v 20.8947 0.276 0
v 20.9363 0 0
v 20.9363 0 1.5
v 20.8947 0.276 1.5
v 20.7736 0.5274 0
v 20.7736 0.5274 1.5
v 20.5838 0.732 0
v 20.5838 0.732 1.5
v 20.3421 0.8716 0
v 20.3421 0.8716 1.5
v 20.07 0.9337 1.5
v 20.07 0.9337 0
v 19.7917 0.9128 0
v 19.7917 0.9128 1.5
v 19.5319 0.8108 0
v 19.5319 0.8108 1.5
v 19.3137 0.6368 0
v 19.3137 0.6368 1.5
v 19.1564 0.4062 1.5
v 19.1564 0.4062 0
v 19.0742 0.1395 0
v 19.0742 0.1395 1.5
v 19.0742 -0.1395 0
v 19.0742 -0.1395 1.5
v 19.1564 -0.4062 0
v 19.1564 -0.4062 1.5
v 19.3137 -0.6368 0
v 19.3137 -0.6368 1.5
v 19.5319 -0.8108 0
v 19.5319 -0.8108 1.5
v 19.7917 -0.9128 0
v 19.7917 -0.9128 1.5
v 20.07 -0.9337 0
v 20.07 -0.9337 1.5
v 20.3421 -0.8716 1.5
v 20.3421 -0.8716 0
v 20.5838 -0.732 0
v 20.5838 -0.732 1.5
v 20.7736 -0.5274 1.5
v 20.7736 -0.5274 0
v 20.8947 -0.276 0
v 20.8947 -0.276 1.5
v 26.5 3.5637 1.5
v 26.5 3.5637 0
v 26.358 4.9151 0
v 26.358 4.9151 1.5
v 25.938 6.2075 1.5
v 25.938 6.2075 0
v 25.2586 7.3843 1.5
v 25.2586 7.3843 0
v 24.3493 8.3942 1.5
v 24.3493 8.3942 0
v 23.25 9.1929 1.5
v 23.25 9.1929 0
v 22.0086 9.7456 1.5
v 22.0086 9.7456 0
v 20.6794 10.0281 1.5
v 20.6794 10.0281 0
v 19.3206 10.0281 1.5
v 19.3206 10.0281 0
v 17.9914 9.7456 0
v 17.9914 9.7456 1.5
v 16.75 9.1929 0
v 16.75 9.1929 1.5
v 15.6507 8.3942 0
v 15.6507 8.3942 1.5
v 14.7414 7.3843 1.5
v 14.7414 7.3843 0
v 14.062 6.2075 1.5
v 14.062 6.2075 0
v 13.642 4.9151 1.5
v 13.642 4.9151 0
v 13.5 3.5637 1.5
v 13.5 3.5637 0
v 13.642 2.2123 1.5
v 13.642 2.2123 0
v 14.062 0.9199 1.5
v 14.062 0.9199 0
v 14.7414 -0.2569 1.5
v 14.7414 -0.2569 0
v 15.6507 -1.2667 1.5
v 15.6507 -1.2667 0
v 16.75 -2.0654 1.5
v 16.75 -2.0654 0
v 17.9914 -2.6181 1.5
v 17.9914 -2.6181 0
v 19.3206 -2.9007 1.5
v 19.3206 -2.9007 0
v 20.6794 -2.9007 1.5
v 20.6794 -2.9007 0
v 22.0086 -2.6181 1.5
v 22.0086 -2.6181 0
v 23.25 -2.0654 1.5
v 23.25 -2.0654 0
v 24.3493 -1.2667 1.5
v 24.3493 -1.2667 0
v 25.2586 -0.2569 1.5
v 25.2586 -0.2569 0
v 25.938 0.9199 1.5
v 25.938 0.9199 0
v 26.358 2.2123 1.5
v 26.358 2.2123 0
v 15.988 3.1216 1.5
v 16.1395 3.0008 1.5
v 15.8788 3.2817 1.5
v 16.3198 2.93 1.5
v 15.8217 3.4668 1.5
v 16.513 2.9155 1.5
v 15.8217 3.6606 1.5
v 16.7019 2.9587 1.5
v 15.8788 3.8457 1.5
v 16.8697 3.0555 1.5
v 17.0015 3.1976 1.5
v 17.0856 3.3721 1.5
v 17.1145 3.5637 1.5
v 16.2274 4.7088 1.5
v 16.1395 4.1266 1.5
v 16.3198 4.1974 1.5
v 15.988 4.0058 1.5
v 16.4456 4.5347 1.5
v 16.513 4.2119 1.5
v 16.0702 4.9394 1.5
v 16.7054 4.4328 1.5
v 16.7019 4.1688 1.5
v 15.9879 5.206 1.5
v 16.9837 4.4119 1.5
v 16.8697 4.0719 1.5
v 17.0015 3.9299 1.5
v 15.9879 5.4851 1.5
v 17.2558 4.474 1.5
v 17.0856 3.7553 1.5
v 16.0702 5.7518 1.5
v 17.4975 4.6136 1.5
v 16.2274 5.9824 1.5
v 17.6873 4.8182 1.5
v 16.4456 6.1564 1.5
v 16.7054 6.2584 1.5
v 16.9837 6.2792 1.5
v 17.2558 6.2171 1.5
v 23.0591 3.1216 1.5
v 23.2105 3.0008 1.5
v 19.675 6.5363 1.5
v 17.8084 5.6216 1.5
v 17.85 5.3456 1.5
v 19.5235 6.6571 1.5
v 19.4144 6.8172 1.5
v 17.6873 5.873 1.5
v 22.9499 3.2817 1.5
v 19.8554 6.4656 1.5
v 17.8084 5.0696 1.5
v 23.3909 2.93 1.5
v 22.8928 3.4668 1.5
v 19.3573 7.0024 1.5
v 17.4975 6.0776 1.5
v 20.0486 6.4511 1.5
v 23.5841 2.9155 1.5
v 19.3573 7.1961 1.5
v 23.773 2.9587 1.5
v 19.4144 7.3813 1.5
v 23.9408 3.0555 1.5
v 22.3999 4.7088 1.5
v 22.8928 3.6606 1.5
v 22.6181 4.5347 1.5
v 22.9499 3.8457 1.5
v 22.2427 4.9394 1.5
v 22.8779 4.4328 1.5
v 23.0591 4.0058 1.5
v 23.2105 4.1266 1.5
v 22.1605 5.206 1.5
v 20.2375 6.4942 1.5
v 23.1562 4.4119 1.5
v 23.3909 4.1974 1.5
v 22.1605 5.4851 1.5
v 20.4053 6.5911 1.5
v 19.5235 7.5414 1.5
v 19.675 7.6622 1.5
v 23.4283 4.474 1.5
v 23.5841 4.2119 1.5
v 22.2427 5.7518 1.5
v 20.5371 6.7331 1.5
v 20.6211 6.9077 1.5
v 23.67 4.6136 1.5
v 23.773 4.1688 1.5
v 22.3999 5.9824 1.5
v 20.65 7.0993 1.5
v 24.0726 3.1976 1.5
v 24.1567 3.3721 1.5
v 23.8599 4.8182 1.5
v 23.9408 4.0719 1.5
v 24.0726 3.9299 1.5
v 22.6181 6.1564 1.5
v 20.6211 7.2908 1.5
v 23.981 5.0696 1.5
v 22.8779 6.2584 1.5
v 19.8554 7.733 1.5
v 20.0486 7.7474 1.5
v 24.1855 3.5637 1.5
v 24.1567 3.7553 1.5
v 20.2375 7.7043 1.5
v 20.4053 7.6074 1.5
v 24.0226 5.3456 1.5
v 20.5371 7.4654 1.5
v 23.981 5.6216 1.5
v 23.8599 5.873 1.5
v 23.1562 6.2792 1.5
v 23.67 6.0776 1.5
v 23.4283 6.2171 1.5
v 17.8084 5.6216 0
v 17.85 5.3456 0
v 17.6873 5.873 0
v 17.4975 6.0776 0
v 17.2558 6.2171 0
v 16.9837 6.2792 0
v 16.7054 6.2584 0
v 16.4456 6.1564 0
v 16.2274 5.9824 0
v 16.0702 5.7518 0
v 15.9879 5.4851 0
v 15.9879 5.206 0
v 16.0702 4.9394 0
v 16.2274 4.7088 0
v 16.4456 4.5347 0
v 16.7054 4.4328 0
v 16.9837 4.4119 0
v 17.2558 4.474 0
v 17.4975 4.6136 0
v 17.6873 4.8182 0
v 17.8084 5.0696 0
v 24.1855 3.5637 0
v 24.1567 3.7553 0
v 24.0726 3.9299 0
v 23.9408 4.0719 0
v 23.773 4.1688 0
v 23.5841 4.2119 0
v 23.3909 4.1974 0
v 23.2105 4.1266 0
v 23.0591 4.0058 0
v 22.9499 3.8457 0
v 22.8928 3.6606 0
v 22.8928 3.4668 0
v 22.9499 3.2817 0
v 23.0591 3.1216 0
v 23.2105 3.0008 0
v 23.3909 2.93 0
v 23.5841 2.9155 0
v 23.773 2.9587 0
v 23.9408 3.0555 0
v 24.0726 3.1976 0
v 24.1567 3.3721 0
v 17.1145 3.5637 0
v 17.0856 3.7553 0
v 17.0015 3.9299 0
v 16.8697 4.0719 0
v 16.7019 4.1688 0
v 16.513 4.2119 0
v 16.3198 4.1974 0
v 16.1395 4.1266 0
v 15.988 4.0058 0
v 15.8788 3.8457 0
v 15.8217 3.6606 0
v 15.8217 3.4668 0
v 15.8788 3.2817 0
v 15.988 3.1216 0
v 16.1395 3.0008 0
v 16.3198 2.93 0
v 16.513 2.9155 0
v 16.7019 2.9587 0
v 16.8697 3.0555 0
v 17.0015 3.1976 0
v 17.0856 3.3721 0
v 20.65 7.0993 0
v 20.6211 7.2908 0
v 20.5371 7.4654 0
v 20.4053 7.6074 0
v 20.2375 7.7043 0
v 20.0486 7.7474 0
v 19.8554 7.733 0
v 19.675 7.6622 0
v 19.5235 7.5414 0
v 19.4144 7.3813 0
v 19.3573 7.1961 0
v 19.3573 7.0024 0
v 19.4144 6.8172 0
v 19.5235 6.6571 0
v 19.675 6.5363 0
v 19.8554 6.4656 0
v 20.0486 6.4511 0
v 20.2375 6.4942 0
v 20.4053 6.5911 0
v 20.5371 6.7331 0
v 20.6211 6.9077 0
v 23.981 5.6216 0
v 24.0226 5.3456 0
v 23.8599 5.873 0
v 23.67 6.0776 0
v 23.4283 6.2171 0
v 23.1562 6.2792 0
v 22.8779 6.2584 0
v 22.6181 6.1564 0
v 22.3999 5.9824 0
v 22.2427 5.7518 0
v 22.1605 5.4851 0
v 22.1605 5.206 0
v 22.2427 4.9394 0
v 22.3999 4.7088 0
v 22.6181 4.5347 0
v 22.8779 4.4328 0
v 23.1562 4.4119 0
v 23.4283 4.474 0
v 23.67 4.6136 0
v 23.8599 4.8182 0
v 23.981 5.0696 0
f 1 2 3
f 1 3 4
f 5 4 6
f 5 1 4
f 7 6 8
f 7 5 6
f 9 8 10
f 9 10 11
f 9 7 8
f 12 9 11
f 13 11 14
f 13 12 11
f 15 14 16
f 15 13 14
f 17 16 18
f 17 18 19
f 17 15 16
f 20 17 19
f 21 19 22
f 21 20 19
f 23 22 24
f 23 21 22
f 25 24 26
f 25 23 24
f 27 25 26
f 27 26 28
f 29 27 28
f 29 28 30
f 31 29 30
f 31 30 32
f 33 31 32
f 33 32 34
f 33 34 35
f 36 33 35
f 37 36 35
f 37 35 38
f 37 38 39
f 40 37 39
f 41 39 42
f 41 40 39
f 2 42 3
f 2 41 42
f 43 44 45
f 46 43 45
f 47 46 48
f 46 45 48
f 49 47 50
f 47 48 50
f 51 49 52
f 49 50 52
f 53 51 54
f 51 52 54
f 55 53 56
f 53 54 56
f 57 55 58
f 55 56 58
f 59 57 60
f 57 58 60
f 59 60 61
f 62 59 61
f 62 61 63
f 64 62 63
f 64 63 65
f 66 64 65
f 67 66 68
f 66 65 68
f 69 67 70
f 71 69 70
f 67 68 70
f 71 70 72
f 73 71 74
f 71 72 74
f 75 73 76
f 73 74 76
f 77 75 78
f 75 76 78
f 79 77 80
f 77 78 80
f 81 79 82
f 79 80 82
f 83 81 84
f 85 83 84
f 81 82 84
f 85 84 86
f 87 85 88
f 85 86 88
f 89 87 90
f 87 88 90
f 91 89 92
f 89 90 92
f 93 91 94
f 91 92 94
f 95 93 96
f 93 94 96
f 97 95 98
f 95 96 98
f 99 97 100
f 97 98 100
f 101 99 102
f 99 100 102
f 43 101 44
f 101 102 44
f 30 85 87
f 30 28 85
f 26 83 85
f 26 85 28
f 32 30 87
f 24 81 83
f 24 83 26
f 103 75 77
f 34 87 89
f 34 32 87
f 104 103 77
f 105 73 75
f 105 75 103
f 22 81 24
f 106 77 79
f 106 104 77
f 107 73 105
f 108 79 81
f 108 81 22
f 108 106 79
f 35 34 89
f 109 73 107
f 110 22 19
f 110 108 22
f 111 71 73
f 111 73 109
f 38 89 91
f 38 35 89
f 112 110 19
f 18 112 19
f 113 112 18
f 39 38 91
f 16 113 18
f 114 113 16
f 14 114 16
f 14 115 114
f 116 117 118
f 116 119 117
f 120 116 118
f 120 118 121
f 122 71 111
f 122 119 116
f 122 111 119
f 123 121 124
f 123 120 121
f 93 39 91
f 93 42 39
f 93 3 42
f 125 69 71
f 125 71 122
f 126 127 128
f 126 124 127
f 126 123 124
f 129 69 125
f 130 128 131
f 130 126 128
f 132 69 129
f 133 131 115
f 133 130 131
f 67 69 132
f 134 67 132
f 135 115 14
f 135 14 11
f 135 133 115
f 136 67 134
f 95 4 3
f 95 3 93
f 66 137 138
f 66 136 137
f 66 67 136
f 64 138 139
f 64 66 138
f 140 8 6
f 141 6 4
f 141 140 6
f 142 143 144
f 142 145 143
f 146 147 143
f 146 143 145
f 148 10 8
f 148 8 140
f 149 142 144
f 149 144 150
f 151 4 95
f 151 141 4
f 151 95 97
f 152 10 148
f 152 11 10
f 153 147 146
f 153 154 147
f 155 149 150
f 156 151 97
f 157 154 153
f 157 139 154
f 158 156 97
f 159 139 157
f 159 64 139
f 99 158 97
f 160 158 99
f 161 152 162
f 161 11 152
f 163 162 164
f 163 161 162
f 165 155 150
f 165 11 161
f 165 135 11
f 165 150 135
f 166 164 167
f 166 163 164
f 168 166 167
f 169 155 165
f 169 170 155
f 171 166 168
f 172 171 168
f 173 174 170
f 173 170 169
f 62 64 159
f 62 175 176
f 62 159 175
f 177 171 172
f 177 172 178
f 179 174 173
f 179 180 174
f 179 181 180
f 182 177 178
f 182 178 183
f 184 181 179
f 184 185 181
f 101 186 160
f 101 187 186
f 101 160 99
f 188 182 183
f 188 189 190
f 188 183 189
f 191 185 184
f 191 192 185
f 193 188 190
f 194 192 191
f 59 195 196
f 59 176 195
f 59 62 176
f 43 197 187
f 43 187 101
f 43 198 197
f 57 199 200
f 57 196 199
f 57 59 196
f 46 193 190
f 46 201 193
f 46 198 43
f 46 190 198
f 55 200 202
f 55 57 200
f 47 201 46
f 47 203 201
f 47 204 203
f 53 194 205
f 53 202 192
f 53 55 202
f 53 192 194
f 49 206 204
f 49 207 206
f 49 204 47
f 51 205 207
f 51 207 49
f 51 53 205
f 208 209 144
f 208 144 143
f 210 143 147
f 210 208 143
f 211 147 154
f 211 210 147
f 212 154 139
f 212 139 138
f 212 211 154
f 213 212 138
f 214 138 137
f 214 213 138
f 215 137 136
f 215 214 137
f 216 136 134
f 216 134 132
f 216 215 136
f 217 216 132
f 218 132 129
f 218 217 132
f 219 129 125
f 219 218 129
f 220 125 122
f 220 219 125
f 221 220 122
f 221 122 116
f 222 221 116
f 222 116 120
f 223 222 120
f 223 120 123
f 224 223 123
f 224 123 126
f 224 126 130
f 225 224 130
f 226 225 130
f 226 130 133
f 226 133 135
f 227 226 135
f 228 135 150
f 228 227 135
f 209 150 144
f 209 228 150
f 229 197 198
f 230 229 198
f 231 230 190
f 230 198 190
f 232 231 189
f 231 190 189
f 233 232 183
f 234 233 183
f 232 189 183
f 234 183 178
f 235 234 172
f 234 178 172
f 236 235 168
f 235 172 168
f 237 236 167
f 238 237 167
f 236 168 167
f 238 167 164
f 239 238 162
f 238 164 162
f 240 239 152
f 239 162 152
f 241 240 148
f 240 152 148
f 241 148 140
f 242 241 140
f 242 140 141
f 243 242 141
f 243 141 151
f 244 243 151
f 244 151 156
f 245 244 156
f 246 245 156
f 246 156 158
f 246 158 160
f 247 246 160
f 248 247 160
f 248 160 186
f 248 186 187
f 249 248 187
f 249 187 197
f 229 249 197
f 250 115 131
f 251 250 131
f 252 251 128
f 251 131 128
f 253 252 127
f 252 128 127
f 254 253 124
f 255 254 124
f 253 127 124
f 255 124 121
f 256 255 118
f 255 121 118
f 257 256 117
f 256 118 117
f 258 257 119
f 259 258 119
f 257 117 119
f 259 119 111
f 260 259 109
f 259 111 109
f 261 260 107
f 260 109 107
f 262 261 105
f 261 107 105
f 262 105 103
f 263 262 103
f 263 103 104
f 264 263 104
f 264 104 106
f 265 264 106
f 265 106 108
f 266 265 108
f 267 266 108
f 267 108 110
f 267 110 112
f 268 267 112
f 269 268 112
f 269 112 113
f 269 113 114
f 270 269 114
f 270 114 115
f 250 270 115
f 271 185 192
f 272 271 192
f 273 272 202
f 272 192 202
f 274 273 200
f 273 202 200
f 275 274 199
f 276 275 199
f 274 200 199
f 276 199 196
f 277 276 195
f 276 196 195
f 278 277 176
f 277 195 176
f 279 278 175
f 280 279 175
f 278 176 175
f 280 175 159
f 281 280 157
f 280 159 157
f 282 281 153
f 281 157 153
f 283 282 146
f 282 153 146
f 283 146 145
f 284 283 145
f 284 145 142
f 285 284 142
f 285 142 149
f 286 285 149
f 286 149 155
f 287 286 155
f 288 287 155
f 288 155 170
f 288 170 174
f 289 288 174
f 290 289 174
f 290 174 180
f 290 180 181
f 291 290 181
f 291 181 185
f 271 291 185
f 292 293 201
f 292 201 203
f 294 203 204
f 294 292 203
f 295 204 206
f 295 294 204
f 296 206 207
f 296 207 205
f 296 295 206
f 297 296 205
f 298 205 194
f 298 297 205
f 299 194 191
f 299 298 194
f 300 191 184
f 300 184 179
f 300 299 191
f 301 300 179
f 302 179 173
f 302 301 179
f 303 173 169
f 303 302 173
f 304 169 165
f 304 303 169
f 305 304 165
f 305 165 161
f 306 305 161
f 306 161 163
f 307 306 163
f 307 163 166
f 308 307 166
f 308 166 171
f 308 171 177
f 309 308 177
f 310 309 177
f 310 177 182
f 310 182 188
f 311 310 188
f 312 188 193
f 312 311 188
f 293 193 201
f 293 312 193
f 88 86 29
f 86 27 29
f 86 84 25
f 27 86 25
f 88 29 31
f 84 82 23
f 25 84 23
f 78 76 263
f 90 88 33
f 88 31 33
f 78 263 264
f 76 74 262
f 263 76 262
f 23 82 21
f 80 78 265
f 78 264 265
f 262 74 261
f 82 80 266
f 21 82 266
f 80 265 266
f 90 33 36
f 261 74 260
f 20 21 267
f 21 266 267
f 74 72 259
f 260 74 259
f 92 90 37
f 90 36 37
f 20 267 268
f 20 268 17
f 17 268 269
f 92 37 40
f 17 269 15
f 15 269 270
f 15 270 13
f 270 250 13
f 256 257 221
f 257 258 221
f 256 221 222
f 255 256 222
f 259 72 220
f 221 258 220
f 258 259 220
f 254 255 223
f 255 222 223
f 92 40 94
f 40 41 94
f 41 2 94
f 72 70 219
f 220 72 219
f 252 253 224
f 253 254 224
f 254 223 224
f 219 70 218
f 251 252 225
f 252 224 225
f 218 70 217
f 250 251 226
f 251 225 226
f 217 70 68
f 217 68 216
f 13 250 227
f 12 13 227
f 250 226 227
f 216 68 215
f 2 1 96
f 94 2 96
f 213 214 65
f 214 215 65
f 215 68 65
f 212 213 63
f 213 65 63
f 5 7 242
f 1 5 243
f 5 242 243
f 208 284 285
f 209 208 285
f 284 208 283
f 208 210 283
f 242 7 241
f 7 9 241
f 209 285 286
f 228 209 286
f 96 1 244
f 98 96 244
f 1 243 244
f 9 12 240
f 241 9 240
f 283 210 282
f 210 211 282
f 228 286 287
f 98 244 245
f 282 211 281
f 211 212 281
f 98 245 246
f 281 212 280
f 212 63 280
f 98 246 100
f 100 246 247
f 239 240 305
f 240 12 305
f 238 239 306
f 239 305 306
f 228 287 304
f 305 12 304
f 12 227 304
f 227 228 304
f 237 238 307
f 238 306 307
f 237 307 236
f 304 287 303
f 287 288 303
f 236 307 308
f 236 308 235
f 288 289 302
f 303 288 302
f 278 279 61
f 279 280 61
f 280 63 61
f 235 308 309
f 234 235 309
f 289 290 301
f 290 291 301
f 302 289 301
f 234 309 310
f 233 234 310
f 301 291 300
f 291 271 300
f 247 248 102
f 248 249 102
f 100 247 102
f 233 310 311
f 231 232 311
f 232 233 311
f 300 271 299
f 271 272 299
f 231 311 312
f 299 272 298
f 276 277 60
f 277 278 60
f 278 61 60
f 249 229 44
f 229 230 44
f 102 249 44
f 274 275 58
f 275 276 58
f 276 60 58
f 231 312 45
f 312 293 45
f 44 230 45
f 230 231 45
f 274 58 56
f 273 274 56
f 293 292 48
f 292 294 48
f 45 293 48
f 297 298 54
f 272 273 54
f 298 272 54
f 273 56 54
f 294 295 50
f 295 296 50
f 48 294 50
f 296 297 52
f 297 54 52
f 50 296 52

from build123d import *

# Parameters (mm, degrees)
SKETCH_R     = 6.5
SKETCH_R_2   = 0.936276
PAD_DEPTH    = 1.5
SKETCH001_R  = 0.65
POCKET_DEPTH = 5


with BuildPart() as part:
    # Sketch → Pad (new body)
    with BuildSketch(Plane.XY):
        with Locations((0, 3.563724)):
            Circle(SKETCH_R)
        with Locations((-3.086276, 5.345586)):
            Circle(SKETCH_R_2, mode=Mode.SUBTRACT)
        with Locations((3.086276, 5.345586)):
            Circle(SKETCH_R_2, mode=Mode.SUBTRACT)
        Circle(SKETCH_R_2, mode=Mode.SUBTRACT)
    extrude(amount=PAD_DEPTH)

    # Sketch001 (on Face6 of Pad) → Pocket (cut)
    with BuildSketch(Plane.XY.offset(1.5)):
        with Locations((-3.535534, 3.563724)):
            Circle(SKETCH001_R)
        with Locations((0, 7.099258)):
            Circle(SKETCH001_R)
        with Locations((3.535534, 3.563724)):
            Circle(SKETCH001_R)
        Circle(SKETCH001_R)
    extrude(amount=-POCKET_DEPTH, mode=Mode.SUBTRACT)


with BuildPart() as part_1:
    # Body placement: moved
    add(part.part.moved(Location((20, 0, 0))))


solid = part_1.part
